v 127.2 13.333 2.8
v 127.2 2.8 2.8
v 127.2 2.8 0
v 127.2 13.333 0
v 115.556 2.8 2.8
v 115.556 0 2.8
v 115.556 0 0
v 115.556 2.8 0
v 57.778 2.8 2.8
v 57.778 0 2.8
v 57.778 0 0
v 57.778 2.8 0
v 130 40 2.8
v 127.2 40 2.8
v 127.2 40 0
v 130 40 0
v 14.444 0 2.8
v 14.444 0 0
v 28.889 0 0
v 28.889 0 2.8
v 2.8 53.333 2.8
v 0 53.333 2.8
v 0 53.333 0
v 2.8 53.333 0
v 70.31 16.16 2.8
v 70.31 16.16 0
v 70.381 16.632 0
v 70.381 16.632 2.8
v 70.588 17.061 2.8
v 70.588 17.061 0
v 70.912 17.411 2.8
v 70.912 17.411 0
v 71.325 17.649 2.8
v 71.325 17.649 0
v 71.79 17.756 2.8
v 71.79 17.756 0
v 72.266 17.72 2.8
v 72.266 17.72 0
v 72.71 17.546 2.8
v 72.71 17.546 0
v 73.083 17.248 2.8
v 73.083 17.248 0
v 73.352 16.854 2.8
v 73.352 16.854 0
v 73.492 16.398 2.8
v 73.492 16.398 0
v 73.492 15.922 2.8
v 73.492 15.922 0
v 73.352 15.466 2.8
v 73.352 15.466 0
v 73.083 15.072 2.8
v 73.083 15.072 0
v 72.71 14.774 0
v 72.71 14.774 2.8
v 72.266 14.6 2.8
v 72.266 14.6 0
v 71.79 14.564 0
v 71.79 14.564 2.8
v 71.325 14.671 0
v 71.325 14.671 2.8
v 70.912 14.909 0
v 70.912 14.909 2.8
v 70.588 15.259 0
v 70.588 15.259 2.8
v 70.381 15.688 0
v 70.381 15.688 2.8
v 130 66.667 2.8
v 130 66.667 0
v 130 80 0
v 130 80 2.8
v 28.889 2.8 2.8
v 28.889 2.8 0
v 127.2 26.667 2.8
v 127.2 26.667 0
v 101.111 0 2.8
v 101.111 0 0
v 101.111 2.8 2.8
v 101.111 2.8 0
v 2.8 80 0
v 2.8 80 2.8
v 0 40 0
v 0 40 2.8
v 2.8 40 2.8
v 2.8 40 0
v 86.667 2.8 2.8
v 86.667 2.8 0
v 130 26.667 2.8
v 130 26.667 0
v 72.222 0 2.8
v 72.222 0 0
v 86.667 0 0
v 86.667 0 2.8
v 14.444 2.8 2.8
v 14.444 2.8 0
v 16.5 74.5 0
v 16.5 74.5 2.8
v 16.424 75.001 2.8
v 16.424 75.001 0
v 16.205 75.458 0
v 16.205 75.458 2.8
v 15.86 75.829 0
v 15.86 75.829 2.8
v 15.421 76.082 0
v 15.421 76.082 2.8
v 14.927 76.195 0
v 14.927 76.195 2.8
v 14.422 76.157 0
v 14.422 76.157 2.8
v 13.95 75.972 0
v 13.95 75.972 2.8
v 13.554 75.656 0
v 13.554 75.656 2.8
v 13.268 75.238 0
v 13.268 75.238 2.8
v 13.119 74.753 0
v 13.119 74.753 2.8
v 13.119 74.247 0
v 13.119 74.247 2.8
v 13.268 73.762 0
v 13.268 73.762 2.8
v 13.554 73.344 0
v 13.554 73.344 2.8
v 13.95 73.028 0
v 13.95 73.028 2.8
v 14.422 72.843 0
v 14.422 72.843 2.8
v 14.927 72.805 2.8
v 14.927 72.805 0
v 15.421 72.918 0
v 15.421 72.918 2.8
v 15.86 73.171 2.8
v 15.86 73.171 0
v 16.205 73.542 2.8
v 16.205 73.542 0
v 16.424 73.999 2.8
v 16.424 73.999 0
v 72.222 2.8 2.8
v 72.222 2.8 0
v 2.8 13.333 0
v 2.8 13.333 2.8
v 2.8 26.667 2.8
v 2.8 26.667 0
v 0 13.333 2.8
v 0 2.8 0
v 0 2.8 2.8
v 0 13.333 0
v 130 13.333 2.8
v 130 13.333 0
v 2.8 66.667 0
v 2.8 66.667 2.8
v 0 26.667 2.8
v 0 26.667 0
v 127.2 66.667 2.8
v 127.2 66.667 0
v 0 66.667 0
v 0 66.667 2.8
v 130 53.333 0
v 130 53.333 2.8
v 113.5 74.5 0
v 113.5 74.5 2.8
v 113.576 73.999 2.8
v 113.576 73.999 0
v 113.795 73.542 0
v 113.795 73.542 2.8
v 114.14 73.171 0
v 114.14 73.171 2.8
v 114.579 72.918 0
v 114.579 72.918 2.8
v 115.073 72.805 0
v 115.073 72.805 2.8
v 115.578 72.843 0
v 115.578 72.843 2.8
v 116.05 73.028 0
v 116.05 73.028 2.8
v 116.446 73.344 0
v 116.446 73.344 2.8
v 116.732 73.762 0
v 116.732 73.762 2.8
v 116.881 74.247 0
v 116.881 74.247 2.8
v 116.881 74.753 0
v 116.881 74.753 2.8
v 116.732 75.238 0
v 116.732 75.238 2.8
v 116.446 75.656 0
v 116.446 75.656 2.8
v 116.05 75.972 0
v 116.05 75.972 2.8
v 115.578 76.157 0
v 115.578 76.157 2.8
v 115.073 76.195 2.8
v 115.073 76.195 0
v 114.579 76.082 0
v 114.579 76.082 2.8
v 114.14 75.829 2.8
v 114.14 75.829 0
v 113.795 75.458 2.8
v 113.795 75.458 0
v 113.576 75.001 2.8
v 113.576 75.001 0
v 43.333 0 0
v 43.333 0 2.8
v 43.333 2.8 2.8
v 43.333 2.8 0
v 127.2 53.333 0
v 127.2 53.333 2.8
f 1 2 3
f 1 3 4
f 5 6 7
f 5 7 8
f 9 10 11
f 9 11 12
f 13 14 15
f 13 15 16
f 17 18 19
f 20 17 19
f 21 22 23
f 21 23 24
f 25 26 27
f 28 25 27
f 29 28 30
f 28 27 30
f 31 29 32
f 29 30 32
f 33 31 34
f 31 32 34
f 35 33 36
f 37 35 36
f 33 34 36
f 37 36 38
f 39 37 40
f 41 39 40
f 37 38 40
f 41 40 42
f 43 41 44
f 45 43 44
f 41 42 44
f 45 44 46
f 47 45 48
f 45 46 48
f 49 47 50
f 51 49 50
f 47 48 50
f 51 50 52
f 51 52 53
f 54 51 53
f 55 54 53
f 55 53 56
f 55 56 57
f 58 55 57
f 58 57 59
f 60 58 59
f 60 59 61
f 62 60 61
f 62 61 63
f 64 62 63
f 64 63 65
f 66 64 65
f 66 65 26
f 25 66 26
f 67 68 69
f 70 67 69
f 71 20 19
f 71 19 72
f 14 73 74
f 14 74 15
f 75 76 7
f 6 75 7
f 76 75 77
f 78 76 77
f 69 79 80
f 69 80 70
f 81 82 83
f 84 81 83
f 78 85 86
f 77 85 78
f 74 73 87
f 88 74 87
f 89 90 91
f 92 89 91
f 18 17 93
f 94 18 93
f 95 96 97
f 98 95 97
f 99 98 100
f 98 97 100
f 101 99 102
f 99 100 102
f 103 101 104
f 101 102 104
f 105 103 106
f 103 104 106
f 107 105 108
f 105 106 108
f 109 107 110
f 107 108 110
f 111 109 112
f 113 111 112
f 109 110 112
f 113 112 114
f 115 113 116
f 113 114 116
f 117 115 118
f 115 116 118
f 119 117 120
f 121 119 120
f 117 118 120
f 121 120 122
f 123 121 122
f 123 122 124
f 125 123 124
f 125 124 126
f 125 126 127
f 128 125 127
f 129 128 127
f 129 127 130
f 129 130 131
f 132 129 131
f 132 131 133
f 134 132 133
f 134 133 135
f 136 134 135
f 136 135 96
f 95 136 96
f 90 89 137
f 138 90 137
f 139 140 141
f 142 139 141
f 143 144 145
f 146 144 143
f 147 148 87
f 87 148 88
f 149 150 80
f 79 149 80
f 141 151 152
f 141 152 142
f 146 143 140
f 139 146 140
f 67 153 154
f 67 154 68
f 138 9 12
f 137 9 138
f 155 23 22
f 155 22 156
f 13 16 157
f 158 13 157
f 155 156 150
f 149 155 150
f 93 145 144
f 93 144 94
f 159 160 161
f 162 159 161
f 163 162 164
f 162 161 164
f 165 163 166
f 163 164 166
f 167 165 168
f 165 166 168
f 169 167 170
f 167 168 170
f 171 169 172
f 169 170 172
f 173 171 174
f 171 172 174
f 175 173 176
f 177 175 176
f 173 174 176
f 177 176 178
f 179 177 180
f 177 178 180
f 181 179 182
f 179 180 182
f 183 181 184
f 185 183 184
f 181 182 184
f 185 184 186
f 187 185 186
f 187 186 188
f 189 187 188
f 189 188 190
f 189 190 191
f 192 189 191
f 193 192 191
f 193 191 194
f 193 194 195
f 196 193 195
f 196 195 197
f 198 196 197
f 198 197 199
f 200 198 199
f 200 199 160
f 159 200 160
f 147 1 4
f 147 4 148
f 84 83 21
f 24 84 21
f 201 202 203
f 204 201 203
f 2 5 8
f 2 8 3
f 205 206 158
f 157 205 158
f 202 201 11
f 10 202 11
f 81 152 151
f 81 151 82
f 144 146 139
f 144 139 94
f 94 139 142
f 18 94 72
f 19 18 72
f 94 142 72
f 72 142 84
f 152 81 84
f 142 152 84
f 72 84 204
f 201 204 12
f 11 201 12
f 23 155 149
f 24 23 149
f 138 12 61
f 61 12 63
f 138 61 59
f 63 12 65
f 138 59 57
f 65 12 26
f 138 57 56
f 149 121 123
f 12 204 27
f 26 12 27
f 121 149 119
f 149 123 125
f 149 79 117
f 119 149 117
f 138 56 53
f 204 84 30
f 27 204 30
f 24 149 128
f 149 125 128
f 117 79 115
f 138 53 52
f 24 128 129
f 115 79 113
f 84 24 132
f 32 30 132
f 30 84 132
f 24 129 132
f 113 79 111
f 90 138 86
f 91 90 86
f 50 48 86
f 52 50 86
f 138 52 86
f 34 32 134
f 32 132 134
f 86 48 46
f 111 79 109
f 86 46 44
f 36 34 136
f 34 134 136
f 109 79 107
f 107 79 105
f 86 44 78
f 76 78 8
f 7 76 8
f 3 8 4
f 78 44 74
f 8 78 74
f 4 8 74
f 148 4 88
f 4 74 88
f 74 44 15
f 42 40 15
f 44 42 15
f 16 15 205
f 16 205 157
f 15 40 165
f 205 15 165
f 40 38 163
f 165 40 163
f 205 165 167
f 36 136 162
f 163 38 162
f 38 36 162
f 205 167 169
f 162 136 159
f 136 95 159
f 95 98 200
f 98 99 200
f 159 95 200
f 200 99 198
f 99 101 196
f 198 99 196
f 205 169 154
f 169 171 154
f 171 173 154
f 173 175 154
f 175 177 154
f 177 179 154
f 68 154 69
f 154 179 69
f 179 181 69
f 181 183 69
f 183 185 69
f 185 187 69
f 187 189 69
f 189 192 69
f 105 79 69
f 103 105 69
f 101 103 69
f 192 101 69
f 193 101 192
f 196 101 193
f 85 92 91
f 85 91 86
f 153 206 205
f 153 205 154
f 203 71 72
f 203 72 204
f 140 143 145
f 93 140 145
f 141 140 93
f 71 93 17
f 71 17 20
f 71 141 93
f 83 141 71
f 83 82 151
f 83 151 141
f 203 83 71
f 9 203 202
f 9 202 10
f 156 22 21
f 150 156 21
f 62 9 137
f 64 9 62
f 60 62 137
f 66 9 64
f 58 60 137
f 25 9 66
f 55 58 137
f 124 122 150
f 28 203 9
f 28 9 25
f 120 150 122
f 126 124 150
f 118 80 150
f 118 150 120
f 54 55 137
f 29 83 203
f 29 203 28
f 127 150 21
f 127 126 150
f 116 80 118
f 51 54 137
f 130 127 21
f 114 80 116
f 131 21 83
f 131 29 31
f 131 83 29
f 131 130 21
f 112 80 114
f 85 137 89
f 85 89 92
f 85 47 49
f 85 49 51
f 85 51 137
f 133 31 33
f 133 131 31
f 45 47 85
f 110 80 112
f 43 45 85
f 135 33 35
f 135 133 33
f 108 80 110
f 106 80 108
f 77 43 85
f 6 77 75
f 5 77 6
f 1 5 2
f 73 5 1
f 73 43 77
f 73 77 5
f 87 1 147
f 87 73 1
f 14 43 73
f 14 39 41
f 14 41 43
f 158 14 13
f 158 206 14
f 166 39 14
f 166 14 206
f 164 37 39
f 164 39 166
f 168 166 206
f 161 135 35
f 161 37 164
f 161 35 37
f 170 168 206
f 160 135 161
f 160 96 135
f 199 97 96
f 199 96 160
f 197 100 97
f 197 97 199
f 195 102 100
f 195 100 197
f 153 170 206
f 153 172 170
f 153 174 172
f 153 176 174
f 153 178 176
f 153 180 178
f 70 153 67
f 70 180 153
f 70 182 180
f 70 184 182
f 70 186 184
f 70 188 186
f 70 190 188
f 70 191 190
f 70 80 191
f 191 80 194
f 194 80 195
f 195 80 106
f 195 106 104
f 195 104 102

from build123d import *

# Parameters (mm, degrees)
SKETCH1_W                = 130
SKETCH1_H                = 80
BOSS_EXTRUDE1_DEPTH      = 2.8
SKETCH2_W                = 14.444444444
SKETCH2_H                = 2.8
SKETCH2_W_2              = 2.8
SKETCH2_H_2              = 13.333333334
SKETCH2_H_3              = 13.333333333
CUT_EXTRUDE1_DEPTH       = 153.669053839
CUT_EXTRUDE2_REACH       = 154.669
SKETCH3_R                = 1.7
TUNING_DRIVER_HOLE_REACH = 154.669
SKETCH4_R                = 1.6


with BuildPart() as part:
    # Sketch1 → Boss-Extrude1 (new body)
    with BuildSketch(Plane.XY):
        with Locations((65, 40)):
            Rectangle(SKETCH1_W, SKETCH1_H)
    extrude(amount=BOSS_EXTRUDE1_DEPTH)

    # Sketch2 → Cut-Extrude1 (cut, through all)
    with BuildSketch(Plane.XY.offset(2.8)):
        with Locations((7.222222222, 1.4)):
            Rectangle(SKETCH2_W, SKETCH2_H)
        with Locations((36.111111111, 1.4)):
            Rectangle(SKETCH2_W, SKETCH2_H)
        with Locations((65, 1.4)):
            Rectangle(SKETCH2_W, SKETCH2_H)
        with Locations((93.888888889, 1.4)):
            Rectangle(SKETCH2_W, SKETCH2_H)
        Polygon((115.555555556, 0), (115.555555556, 2.8), (127.2, 2.8), (127.2, 13.333333333), (130, 13.333333333), (130, 0), align=None)
        with Locations((1.4, 20)):
            Rectangle(SKETCH2_W_2, SKETCH2_H_2)
        with Locations((1.4, 46.666666667)):
            Rectangle(SKETCH2_W_2, SKETCH2_H_3)
        with Locations((1.4, 73.333333334)):
            Rectangle(SKETCH2_W_2, SKETCH2_H_3)
        with Locations((128.6, 33.333333334)):
            Rectangle(SKETCH2_W_2, SKETCH2_H_3)
        with Locations((128.6, 60)):
            Rectangle(SKETCH2_W_2, SKETCH2_H_2)
    extrude(amount=-CUT_EXTRUDE1_DEPTH, mode=Mode.SUBTRACT)

    # Sketch3 → Cut-Extrude2 (cut, up to next)
    with BuildSketch(Plane.XY.offset(2.8), mode=Mode.PRIVATE) as cut_extrude2_sk1:
        with Locations((14.8, 74.5)):
            Circle(SKETCH3_R)
    cut_extrude2_tool1 = extrude(cut_extrude2_sk1.sketch, amount=-CUT_EXTRUDE2_REACH, mode=Mode.PRIVATE) & part.part
    # Sketch3 → Cut-Extrude2 (cut, up to next)
    with BuildSketch(Plane.XY.offset(2.8), mode=Mode.PRIVATE) as cut_extrude2_sk2:
        with Locations(Location((115.2, 74.5, 0), (0, 0, 180))):
            Circle(SKETCH3_R)
    cut_extrude2_tool2 = extrude(cut_extrude2_sk2.sketch, amount=-CUT_EXTRUDE2_REACH, mode=Mode.PRIVATE) & part.part
    add(cut_extrude2_tool1.solids().sort_by_distance((14.8, 74.5, 2.8))[0], mode=Mode.SUBTRACT)
    add(cut_extrude2_tool2.solids().sort_by_distance((115.2, 74.5, 2.8))[0], mode=Mode.SUBTRACT)

    # Sketch4 → Tuning driver hole (cut, up to next)
    with BuildSketch(Plane(origin=(0, 0, 0), x_dir=(-1, 0, 0), z_dir=(0, 0, -1)), mode=Mode.PRIVATE) as tuning_driver_hole_sk1:
        with Locations((-71.91, 16.16)):
            Circle(SKETCH4_R)
    tuning_driver_hole_tool1 = extrude(tuning_driver_hole_sk1.sketch, amount=-TUNING_DRIVER_HOLE_REACH, mode=Mode.PRIVATE) & part.part
    add(tuning_driver_hole_tool1.solids().sort_by_distance((71.91, 16.16, 0))[0], mode=Mode.SUBTRACT)


solid = part.part
